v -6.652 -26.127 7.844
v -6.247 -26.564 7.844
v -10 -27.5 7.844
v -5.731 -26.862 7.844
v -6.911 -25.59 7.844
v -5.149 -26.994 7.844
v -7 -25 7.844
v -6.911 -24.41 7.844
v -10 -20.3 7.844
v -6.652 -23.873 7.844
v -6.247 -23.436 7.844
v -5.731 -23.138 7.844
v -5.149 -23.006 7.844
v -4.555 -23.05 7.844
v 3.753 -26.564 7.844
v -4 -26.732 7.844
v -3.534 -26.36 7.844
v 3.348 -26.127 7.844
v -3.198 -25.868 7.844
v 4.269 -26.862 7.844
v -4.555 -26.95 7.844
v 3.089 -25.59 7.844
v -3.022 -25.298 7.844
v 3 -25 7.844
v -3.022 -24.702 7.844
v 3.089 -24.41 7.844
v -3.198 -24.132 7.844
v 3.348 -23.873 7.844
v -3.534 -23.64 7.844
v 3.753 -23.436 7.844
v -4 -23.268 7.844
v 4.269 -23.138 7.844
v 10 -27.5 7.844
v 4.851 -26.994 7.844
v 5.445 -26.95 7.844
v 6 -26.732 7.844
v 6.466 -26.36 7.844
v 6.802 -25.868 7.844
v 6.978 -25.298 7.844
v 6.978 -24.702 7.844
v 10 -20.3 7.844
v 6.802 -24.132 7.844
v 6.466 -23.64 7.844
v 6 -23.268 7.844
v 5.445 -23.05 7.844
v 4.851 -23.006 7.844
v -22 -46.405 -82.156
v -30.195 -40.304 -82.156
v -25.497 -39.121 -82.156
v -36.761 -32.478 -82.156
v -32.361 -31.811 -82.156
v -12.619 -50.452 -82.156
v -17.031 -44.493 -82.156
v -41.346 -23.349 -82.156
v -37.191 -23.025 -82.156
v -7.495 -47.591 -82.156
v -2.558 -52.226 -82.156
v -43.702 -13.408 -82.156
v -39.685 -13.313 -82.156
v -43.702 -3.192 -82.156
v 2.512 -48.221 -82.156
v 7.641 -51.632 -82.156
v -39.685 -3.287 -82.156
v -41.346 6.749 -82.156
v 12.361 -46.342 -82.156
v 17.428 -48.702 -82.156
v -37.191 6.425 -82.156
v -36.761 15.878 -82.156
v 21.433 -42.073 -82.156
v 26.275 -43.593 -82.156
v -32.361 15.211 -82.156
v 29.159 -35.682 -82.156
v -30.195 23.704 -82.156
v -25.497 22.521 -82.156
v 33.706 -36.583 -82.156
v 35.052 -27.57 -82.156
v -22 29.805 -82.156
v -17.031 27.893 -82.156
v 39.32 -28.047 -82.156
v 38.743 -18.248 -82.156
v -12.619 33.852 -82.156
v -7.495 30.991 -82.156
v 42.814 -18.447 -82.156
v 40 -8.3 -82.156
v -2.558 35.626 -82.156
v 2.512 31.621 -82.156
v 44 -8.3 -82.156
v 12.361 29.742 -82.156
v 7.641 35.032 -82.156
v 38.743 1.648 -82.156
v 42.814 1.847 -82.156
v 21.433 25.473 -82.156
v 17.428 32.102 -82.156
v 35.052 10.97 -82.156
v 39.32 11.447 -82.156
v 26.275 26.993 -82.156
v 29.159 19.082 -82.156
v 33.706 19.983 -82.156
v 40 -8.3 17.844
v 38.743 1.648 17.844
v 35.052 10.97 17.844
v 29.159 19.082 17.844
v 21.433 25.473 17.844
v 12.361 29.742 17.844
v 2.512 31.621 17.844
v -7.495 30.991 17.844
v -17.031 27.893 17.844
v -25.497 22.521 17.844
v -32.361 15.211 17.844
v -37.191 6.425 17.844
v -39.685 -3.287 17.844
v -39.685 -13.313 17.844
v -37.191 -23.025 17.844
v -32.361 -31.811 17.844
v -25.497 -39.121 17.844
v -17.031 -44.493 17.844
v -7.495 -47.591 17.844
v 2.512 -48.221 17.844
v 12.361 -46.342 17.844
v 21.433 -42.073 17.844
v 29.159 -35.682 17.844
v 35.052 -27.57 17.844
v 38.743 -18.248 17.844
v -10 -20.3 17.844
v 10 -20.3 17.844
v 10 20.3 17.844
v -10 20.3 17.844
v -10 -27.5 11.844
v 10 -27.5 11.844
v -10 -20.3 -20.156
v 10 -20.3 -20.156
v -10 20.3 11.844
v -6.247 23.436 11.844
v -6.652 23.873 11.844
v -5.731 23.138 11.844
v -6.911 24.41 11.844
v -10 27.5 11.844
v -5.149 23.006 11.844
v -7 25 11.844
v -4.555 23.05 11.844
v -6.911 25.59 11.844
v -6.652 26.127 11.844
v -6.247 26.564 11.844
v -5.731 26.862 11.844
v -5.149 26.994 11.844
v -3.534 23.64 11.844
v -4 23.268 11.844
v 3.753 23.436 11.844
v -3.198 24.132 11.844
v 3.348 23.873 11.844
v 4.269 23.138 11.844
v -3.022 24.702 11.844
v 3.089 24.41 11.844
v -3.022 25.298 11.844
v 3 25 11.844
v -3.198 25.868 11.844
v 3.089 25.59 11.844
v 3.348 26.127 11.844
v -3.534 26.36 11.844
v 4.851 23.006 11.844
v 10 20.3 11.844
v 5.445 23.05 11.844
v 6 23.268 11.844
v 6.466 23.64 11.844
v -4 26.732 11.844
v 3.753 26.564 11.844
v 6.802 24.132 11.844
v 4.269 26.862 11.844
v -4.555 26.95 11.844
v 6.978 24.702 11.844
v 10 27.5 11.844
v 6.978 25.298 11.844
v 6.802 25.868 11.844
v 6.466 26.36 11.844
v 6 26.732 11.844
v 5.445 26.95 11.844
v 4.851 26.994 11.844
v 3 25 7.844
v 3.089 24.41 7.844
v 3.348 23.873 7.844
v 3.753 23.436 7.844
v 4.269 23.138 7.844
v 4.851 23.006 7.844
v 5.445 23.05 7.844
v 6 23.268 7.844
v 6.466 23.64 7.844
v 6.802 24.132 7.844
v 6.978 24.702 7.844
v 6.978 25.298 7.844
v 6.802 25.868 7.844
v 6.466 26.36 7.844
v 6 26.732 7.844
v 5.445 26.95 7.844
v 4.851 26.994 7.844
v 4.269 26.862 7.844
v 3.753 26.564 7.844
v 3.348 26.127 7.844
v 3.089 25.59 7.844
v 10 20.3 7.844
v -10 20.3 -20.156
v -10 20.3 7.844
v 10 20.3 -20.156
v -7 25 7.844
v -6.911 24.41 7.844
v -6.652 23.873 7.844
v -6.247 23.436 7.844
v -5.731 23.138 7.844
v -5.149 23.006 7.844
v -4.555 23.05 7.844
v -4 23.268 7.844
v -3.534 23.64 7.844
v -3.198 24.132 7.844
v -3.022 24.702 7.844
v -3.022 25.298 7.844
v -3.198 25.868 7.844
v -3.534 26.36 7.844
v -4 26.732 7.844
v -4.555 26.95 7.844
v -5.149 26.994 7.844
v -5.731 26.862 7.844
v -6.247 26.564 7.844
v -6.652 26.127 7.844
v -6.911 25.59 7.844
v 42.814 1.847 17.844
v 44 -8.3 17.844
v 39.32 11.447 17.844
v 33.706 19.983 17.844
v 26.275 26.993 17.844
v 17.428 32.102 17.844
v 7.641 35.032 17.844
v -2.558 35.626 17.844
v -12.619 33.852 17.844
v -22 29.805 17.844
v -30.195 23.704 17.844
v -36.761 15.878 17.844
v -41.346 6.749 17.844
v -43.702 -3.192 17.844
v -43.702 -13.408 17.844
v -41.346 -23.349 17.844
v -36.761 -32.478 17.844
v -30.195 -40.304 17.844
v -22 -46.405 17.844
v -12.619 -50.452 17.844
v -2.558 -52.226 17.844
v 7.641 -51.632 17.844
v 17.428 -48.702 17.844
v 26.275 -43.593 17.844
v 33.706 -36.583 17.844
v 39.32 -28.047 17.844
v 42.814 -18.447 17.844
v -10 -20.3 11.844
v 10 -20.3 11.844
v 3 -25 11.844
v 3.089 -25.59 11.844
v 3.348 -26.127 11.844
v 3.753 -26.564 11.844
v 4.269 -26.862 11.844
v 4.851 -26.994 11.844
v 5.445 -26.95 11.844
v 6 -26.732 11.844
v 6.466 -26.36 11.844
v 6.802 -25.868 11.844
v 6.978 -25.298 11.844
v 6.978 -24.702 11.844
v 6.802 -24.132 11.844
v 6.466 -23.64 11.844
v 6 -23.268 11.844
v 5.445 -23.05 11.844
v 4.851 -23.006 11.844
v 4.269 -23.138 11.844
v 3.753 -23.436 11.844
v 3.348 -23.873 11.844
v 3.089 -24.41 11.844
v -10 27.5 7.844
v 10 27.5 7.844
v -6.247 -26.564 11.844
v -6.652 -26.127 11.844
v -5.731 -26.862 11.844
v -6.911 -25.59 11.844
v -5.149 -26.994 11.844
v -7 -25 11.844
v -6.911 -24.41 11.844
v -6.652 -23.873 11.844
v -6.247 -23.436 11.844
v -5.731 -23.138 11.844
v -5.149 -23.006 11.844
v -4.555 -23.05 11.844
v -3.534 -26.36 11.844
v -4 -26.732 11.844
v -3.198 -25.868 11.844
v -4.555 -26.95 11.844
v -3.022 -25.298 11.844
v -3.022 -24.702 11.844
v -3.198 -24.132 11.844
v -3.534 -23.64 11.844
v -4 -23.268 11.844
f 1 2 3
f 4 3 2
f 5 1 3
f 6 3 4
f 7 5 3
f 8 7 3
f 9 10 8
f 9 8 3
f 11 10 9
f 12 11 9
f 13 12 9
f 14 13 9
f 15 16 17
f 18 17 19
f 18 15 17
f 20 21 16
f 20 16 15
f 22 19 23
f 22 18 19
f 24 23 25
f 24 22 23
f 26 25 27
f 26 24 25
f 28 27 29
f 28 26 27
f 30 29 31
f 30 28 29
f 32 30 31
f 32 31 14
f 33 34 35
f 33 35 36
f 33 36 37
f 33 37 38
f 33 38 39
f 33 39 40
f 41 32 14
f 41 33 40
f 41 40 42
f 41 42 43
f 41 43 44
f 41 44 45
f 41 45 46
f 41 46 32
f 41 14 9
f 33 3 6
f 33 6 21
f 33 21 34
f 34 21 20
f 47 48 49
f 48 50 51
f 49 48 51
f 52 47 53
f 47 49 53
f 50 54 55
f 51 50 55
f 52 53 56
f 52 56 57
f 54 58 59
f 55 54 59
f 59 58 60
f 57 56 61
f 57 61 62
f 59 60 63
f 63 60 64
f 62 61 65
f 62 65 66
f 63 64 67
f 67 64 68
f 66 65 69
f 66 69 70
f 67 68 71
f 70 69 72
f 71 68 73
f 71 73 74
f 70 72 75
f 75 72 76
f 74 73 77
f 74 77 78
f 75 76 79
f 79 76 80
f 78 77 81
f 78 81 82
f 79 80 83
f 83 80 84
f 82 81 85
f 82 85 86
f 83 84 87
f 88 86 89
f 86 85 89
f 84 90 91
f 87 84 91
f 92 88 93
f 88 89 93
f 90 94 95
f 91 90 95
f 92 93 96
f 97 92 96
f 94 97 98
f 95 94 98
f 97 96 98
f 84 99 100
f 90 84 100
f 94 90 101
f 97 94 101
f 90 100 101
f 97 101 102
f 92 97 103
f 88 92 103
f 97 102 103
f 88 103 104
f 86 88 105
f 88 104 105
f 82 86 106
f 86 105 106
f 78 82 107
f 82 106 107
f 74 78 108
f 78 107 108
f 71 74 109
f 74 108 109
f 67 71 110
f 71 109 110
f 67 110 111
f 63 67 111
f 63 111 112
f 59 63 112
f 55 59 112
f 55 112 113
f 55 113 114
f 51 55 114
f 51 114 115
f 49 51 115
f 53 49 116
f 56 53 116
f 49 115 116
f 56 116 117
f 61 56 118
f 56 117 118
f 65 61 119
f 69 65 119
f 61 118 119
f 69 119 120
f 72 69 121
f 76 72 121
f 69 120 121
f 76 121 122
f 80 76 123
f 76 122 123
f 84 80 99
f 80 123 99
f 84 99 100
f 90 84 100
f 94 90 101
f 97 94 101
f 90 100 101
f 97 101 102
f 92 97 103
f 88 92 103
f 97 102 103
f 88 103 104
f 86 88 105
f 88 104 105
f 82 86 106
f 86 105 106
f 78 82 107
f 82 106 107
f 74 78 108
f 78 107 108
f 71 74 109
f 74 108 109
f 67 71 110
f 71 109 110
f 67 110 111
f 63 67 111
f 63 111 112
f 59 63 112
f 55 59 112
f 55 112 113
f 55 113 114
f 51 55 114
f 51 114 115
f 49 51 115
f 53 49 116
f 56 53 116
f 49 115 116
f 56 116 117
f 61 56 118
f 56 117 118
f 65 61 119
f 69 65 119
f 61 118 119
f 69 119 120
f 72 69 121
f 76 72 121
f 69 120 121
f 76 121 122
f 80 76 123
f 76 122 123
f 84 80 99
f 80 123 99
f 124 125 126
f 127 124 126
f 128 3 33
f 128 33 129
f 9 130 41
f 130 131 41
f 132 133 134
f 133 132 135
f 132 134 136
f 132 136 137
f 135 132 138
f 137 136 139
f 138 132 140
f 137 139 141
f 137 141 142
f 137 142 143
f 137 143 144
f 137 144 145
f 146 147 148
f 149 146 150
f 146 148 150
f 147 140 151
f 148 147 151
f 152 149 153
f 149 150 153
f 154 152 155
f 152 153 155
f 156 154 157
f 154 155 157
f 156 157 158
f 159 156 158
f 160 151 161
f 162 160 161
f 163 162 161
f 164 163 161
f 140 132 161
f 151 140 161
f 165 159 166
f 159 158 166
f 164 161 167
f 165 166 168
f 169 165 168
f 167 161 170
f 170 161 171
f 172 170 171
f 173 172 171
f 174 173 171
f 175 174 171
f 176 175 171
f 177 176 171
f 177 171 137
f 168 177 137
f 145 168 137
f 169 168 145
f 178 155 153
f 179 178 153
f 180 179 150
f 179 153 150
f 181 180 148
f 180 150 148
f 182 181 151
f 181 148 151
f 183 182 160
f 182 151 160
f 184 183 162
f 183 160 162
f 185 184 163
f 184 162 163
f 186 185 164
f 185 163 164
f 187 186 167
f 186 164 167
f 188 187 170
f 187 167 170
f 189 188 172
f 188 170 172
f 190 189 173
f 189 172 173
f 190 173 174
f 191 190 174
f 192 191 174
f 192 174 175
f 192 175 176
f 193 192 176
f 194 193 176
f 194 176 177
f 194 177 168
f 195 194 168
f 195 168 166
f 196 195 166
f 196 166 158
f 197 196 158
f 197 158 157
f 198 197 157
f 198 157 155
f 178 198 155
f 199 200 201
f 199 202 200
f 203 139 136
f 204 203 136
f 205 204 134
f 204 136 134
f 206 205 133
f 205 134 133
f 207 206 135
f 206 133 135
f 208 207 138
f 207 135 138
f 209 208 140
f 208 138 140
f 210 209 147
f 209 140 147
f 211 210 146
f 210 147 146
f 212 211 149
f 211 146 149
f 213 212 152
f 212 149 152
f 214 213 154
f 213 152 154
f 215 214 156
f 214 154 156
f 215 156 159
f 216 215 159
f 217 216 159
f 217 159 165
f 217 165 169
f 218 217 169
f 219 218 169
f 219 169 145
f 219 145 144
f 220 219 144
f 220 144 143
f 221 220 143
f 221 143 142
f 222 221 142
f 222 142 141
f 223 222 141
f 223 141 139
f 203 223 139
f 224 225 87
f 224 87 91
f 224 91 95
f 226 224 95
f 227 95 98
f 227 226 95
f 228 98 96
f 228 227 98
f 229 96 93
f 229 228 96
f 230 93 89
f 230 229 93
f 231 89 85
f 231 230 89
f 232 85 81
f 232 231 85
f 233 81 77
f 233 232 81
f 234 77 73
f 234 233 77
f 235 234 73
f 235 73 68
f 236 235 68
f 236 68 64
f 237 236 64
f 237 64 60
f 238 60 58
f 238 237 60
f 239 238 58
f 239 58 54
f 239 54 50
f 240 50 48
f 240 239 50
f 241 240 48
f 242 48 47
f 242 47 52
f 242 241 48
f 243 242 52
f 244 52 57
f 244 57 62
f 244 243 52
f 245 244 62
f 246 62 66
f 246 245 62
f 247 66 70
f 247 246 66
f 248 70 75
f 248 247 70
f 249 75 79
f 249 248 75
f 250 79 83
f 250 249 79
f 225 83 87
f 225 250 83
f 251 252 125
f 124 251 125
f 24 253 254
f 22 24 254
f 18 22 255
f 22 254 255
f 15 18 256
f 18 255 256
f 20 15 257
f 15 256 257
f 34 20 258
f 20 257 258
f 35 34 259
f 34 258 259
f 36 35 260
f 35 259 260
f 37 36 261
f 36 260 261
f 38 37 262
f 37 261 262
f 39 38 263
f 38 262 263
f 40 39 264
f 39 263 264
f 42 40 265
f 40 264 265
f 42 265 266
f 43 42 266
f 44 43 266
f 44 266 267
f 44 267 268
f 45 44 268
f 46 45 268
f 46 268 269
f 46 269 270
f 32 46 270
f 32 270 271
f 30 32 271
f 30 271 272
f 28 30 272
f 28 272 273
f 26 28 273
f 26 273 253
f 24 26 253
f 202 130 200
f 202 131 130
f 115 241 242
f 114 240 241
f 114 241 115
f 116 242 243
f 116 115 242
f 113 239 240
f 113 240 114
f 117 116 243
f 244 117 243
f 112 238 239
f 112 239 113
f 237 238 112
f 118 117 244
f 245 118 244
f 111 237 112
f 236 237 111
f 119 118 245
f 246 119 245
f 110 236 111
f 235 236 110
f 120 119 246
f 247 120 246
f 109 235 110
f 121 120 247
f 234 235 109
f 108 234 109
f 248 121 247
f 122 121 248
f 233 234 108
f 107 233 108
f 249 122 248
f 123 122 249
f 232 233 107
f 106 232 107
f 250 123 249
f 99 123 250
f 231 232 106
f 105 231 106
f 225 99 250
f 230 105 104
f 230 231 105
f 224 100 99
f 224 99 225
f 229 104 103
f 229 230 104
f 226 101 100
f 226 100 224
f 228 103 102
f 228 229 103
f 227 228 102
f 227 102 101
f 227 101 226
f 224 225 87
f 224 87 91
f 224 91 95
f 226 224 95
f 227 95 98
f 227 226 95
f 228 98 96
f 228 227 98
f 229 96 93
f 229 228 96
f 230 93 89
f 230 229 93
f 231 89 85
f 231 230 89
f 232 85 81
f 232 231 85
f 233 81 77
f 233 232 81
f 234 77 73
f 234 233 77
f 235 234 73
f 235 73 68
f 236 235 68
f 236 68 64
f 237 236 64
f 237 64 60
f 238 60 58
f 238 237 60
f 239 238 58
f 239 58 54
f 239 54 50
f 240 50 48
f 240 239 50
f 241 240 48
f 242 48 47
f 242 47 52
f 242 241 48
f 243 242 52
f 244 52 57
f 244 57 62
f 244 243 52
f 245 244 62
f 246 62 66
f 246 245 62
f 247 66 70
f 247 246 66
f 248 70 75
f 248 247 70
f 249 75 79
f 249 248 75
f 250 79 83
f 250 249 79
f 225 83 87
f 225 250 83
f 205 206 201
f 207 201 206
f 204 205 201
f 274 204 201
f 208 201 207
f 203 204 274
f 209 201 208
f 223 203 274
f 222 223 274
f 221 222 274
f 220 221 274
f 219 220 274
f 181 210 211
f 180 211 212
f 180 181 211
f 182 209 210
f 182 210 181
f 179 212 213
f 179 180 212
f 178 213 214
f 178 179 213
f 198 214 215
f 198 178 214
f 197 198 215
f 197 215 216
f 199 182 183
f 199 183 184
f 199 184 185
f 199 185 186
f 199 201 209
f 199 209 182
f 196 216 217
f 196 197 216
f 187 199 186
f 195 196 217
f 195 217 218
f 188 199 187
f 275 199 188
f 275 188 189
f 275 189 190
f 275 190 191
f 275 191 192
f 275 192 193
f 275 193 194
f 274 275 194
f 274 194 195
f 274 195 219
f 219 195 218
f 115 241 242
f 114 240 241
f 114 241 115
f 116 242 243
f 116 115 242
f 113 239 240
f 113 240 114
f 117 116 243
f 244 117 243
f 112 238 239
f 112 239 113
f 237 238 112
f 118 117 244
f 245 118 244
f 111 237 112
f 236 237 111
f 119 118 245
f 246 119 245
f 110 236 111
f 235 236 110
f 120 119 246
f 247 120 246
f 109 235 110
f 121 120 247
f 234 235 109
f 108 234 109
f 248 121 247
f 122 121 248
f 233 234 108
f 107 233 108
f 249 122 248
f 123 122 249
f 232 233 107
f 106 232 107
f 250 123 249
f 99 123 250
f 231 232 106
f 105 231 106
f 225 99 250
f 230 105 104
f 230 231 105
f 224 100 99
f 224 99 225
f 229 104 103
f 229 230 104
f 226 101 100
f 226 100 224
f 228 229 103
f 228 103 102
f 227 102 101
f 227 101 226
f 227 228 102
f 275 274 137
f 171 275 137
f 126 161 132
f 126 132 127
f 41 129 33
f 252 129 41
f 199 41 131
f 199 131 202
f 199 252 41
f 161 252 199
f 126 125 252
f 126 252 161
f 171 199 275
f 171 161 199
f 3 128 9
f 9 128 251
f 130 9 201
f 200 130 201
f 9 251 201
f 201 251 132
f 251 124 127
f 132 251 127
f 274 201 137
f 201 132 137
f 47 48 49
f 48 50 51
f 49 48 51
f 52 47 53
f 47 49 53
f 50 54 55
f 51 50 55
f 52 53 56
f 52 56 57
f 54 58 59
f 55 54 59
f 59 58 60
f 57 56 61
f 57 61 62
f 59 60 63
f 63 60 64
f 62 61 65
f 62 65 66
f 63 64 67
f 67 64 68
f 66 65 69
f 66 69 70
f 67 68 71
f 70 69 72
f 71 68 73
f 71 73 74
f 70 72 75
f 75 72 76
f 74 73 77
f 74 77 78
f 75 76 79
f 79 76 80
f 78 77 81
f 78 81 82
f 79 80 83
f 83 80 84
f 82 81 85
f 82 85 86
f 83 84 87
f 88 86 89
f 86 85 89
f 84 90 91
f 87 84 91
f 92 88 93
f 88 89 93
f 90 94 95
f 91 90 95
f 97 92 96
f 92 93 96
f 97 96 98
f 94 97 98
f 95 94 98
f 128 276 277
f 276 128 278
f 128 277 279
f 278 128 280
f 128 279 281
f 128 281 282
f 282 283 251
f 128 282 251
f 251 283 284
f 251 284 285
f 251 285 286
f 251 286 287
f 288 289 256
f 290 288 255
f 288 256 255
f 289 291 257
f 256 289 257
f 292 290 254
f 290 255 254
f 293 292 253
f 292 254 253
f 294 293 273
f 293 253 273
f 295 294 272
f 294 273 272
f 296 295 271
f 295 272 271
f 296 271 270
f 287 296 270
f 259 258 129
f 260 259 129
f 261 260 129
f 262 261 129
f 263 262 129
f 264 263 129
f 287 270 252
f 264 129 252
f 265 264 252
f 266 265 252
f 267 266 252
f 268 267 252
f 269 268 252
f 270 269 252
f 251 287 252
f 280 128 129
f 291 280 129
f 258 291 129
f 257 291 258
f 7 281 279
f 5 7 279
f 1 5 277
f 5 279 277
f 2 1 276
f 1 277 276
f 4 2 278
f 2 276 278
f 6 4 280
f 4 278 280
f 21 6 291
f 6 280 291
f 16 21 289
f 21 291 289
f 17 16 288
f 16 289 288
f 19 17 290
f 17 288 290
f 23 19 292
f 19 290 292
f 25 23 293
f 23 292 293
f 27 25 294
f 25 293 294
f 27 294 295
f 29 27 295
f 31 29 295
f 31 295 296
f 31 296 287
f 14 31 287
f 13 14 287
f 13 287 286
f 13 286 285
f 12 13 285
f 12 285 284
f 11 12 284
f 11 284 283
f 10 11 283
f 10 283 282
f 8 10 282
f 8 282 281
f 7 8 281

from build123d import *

# Parameters (mm, degrees)
F0_W     = 7.2
F0_H     = 4
F0_W_2   = 40.6
F0_H_2   = 6
F0_H_3   = 28
F1_DEPTH = 10
F4_D     = 4
F3_R     = 44
F3_R_2   = 40
F5_DEPTH = 100
F6_DEPTH = 100


with BuildPart() as f1:
    # F0 (on Right) → F1 (new body, symmetric)
    with BuildSketch(Plane.YZ):
        with Locations((23.9, 9.8437508568)):
            Rectangle(F0_W, F0_H)
        with Locations((0, 14.8437508568)):
            Rectangle(F0_W_2, F0_H_2)
        with Locations((0, -6.1562491432)):
            Rectangle(F0_W_2, F0_H_3)
        with Locations((-23.9, 9.8437508568)):
            Rectangle(F0_W, F0_H)
        with Locations((0, 9.8437508568)):
            Rectangle(F0_W_2, F0_H)
    extrude(amount=F1_DEPTH, both=True)

    # F4 (through all)
    with Locations(Plane(origin=(0, 0, 0), x_dir=(1, 0, 0), z_dir=(0, 0, -1))):
        with Locations((-5, -25), (5, -25), (5, 25), (-5, 25)):
            Hole(F4_D / 2)


with BuildPart() as f5:
    # F3 (on face) → F5 (new body)
    with BuildSketch(Plane.XY.offset(17.8437508568)):
        with Locations((0, -8.3)):
            Circle(F3_R)
        with Locations((0, -8.3)):
            Circle(F3_R_2, mode=Mode.SUBTRACT)
    extrude(amount=-F5_DEPTH)


with BuildPart() as f6:
    # F3 (on face) → F6 (new body, through all)
    with BuildSketch(Plane.XY.offset(17.8437508568)):
        with Locations((0, -8.3)):
            Circle(F3_R)
        with Locations((0, -8.3)):
            Circle(F3_R_2, mode=Mode.SUBTRACT)
    extrude(amount=-F6_DEPTH)


solid = Compound([f1.part, f5.part, f6.part])
